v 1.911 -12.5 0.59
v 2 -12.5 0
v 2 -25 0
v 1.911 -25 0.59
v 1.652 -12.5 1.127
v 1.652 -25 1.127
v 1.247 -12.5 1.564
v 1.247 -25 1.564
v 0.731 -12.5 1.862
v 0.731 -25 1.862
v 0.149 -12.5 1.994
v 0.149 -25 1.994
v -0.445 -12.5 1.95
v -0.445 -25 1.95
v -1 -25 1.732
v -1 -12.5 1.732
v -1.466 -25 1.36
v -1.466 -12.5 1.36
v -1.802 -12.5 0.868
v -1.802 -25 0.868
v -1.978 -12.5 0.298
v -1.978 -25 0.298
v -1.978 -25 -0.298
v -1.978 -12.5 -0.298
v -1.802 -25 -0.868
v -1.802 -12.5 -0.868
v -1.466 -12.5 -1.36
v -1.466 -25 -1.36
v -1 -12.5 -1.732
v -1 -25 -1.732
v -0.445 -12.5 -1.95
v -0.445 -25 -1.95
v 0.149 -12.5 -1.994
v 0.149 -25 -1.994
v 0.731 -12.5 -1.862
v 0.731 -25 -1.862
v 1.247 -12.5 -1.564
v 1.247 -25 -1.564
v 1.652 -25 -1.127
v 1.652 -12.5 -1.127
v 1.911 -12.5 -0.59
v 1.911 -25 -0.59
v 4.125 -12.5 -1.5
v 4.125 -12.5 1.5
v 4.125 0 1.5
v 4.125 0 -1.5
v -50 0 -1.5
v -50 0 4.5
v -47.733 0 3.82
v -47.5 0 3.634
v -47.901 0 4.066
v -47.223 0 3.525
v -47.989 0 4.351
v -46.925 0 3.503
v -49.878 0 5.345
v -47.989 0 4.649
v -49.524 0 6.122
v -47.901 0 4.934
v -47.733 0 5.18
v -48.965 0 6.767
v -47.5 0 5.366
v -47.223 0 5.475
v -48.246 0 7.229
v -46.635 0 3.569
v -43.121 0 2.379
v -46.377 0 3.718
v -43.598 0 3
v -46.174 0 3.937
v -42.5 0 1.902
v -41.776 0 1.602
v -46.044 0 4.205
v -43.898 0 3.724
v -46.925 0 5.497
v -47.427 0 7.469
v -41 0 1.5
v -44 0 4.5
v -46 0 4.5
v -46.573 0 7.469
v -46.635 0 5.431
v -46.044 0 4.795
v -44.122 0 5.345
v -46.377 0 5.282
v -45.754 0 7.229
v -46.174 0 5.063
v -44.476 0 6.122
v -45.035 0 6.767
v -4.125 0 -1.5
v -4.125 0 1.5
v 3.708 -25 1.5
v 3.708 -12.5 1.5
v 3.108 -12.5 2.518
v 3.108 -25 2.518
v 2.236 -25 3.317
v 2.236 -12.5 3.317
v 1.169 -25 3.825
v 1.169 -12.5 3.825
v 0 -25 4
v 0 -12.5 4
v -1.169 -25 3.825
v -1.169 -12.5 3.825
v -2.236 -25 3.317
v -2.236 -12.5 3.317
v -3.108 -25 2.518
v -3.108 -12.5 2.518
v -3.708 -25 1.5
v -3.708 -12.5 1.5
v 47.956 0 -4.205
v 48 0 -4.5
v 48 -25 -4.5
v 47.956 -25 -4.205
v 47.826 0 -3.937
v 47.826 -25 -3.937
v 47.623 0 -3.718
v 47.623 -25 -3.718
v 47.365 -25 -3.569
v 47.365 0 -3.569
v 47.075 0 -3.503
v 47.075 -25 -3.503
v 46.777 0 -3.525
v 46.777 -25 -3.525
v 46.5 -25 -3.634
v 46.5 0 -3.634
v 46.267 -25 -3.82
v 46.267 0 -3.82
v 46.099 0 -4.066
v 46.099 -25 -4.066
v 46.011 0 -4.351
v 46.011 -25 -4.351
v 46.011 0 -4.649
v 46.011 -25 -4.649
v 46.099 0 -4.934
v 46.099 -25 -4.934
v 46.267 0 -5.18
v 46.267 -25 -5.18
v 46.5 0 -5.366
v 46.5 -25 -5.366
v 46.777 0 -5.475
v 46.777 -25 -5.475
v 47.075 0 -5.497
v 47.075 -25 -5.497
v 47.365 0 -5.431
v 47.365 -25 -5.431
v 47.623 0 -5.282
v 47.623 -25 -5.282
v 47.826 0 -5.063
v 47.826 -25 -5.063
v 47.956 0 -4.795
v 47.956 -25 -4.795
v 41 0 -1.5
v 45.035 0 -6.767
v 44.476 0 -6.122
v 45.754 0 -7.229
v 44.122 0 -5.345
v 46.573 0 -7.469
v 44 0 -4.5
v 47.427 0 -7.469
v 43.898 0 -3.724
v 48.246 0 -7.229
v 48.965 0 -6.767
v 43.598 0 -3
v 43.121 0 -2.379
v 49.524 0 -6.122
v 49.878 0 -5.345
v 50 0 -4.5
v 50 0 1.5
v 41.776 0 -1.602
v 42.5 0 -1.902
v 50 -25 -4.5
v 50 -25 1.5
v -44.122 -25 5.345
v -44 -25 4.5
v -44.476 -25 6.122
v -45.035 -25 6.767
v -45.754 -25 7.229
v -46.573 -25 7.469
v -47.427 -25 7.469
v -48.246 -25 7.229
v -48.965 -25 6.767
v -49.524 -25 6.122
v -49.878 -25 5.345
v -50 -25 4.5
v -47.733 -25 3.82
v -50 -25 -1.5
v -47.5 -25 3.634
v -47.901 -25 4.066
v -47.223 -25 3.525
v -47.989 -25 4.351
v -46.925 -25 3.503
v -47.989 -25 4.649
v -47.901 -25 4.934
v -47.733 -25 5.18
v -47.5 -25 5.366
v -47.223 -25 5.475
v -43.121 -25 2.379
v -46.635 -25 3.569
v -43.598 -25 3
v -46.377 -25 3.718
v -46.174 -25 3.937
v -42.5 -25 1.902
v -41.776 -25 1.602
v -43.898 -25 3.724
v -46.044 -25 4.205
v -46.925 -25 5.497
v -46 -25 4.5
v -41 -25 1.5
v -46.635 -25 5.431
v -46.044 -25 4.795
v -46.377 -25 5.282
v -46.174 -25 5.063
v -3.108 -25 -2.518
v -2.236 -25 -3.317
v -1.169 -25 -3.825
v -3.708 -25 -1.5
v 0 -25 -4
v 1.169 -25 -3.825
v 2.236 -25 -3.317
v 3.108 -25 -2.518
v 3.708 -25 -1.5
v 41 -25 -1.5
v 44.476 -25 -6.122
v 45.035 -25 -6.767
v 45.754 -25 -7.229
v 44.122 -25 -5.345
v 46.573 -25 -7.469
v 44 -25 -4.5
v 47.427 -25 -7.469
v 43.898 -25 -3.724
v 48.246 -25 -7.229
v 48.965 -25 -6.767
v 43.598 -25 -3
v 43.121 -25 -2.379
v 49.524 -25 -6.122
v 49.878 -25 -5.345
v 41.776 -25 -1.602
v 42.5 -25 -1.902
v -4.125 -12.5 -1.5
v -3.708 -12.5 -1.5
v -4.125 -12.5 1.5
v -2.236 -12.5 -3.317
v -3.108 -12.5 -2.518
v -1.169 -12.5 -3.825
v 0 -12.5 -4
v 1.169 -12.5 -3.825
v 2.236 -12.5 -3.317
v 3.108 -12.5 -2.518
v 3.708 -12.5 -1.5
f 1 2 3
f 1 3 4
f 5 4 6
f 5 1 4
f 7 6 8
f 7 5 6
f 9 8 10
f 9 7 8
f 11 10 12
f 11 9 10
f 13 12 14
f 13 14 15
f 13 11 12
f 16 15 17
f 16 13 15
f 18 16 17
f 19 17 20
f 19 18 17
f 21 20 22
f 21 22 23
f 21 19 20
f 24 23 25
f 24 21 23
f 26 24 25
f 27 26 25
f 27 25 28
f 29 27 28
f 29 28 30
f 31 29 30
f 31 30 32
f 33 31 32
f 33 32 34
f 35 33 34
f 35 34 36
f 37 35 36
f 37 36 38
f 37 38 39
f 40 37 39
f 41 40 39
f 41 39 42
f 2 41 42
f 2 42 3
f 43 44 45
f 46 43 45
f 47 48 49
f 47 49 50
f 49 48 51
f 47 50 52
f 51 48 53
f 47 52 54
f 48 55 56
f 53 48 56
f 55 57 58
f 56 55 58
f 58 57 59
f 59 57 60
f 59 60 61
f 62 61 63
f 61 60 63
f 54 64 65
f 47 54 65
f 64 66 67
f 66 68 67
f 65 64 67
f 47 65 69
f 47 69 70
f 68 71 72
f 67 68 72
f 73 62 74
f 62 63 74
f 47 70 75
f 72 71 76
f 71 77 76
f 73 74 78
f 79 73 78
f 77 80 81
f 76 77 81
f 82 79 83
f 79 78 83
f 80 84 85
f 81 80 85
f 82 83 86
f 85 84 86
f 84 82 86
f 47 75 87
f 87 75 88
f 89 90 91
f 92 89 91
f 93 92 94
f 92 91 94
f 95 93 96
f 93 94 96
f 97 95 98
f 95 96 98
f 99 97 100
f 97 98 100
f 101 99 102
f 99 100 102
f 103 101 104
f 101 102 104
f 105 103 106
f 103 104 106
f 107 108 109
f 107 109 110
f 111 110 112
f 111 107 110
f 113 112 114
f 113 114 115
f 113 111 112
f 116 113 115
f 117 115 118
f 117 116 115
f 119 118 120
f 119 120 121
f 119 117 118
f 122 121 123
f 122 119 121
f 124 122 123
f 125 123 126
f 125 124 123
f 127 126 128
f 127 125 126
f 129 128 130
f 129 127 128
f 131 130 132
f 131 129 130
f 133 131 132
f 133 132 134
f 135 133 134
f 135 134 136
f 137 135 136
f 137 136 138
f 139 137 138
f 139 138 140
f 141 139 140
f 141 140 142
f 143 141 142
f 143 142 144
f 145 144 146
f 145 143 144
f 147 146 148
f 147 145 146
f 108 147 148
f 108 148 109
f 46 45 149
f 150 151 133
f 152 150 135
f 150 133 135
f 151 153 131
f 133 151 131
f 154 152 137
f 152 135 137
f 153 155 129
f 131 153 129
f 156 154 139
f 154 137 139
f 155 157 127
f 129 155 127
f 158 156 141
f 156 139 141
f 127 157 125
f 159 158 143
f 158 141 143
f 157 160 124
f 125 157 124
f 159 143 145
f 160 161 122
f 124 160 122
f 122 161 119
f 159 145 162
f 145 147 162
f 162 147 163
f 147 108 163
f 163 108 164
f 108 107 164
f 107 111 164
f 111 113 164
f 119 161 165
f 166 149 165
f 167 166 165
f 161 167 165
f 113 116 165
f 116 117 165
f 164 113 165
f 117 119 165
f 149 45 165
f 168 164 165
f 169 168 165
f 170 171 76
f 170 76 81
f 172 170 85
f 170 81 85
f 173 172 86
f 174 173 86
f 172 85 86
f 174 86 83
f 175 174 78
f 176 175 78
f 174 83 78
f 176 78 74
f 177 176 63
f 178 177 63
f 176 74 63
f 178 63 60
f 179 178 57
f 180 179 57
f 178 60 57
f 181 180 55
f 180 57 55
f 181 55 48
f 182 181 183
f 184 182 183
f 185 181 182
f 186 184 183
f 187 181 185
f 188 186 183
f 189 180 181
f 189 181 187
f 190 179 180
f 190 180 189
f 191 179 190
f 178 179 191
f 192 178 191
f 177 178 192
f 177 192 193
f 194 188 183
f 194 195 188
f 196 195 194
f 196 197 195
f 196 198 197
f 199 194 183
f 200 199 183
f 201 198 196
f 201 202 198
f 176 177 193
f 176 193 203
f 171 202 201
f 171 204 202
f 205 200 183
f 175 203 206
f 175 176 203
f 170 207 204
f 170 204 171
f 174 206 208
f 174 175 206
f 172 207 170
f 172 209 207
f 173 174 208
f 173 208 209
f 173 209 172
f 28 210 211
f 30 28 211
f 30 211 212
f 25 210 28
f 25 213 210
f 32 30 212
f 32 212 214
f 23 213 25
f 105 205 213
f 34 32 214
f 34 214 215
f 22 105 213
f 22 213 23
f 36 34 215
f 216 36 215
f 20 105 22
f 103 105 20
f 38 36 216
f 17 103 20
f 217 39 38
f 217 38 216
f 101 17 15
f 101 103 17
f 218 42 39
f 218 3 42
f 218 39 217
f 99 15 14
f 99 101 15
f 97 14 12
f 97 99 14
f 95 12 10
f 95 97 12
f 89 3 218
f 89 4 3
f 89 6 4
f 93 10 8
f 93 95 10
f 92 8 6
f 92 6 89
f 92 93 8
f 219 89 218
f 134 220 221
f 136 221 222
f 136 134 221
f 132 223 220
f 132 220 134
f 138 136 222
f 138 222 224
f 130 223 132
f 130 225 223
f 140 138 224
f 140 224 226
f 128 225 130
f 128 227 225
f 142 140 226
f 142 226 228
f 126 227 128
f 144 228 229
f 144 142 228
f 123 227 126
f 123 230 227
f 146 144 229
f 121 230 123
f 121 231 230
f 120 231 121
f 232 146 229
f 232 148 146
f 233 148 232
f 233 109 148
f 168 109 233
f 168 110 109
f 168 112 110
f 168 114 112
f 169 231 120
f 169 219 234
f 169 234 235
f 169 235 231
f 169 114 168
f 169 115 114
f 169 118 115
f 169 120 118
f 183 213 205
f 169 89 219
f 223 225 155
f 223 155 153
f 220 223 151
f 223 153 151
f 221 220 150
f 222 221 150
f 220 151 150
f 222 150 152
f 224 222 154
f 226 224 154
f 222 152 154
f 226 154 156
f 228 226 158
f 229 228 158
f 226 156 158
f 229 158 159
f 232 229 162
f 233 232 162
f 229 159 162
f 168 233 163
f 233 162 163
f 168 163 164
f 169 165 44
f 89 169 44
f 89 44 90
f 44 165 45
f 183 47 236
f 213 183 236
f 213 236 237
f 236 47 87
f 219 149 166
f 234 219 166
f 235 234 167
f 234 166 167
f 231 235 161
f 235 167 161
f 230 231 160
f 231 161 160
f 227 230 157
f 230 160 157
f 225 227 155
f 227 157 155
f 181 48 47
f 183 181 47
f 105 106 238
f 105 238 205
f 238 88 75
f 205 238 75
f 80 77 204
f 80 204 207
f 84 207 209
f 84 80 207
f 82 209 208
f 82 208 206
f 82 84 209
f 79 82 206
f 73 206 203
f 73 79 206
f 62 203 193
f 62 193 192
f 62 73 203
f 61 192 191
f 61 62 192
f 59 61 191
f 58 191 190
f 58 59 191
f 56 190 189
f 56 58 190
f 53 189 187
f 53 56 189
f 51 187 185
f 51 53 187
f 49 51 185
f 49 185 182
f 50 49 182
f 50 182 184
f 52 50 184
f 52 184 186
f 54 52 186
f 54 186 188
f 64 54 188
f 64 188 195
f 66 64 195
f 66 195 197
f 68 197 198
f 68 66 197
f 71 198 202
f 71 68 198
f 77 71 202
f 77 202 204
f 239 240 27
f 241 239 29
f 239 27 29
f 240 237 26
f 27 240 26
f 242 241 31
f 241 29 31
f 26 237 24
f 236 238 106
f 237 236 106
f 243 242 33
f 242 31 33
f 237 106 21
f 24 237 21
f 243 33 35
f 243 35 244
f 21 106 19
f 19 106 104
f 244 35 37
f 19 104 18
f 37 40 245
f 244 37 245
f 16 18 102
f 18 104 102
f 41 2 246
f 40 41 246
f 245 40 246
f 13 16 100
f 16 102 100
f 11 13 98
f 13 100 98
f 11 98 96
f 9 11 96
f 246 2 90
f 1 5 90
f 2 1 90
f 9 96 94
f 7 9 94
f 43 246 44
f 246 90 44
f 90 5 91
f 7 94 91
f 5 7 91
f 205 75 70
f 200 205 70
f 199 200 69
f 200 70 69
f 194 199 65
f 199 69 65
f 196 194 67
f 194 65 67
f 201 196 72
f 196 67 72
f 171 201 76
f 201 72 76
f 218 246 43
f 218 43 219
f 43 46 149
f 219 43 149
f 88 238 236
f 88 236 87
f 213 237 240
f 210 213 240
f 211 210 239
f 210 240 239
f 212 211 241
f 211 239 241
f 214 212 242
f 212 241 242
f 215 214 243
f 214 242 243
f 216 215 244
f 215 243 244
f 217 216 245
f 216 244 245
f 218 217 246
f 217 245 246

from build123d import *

# Parameters (mm, degrees)
F0_R     = 1
F0_R_2   = 2
F1_DEPTH = 25
F2_W     = 8.25
F2_H     = 12.5
F3_DEPTH = 12.5


with BuildPart() as f1:
    # F0 (on Front) → F1 (new body)
    with BuildSketch(Plane.XZ):
        with BuildLine():
            Line((-3.708099, 1.5), (-41, 1.5))
            ThreePointArc((-41, 1.5), (-43.12132, 2.37868), (-44, 4.5))
            ThreePointArc((-44, 4.5), (-47, 7.5), (-50, 4.5))
            Line((-50, 4.5), (-50, 2.5))
            Line((-50, 2.5), (-50, 1.5))
            Line((-50, 1.5), (-50, -1.5))
            Line((-50, -1.5), (-3.708099, -1.5))
            ThreePointArc((-3.708099, -1.5), (0, -4), (3.708099, -1.5))
            Line((3.708099, -1.5), (41, -1.5))
            ThreePointArc((41, -1.5), (43.12132, -2.37868), (44, -4.5))
            ThreePointArc((44, -4.5), (47, -7.5), (50, -4.5))
            Line((50, -4.5), (50, -1.5))
            Line((50, -1.5), (50, 1.5))
            Line((50, 1.5), (3.708099, 1.5))
            ThreePointArc((3.708099, 1.5), (0, 4), (-3.708099, 1.5))
        make_face()
        with Locations((47, -4.5)):
            Circle(F0_R, mode=Mode.SUBTRACT)
        with Locations((-47, 4.5)):
            Circle(F0_R, mode=Mode.SUBTRACT)
        Circle(F0_R_2, mode=Mode.SUBTRACT)
    extrude(amount=F1_DEPTH)

    # F2 (on Top) → F3 (cut, symmetric)
    with BuildSketch(Plane.XY):
        with Locations((0, -6.25)):
            Rectangle(F2_W, F2_H)
    extrude(amount=F3_DEPTH, both=True, mode=Mode.SUBTRACT)


solid = f1.part
